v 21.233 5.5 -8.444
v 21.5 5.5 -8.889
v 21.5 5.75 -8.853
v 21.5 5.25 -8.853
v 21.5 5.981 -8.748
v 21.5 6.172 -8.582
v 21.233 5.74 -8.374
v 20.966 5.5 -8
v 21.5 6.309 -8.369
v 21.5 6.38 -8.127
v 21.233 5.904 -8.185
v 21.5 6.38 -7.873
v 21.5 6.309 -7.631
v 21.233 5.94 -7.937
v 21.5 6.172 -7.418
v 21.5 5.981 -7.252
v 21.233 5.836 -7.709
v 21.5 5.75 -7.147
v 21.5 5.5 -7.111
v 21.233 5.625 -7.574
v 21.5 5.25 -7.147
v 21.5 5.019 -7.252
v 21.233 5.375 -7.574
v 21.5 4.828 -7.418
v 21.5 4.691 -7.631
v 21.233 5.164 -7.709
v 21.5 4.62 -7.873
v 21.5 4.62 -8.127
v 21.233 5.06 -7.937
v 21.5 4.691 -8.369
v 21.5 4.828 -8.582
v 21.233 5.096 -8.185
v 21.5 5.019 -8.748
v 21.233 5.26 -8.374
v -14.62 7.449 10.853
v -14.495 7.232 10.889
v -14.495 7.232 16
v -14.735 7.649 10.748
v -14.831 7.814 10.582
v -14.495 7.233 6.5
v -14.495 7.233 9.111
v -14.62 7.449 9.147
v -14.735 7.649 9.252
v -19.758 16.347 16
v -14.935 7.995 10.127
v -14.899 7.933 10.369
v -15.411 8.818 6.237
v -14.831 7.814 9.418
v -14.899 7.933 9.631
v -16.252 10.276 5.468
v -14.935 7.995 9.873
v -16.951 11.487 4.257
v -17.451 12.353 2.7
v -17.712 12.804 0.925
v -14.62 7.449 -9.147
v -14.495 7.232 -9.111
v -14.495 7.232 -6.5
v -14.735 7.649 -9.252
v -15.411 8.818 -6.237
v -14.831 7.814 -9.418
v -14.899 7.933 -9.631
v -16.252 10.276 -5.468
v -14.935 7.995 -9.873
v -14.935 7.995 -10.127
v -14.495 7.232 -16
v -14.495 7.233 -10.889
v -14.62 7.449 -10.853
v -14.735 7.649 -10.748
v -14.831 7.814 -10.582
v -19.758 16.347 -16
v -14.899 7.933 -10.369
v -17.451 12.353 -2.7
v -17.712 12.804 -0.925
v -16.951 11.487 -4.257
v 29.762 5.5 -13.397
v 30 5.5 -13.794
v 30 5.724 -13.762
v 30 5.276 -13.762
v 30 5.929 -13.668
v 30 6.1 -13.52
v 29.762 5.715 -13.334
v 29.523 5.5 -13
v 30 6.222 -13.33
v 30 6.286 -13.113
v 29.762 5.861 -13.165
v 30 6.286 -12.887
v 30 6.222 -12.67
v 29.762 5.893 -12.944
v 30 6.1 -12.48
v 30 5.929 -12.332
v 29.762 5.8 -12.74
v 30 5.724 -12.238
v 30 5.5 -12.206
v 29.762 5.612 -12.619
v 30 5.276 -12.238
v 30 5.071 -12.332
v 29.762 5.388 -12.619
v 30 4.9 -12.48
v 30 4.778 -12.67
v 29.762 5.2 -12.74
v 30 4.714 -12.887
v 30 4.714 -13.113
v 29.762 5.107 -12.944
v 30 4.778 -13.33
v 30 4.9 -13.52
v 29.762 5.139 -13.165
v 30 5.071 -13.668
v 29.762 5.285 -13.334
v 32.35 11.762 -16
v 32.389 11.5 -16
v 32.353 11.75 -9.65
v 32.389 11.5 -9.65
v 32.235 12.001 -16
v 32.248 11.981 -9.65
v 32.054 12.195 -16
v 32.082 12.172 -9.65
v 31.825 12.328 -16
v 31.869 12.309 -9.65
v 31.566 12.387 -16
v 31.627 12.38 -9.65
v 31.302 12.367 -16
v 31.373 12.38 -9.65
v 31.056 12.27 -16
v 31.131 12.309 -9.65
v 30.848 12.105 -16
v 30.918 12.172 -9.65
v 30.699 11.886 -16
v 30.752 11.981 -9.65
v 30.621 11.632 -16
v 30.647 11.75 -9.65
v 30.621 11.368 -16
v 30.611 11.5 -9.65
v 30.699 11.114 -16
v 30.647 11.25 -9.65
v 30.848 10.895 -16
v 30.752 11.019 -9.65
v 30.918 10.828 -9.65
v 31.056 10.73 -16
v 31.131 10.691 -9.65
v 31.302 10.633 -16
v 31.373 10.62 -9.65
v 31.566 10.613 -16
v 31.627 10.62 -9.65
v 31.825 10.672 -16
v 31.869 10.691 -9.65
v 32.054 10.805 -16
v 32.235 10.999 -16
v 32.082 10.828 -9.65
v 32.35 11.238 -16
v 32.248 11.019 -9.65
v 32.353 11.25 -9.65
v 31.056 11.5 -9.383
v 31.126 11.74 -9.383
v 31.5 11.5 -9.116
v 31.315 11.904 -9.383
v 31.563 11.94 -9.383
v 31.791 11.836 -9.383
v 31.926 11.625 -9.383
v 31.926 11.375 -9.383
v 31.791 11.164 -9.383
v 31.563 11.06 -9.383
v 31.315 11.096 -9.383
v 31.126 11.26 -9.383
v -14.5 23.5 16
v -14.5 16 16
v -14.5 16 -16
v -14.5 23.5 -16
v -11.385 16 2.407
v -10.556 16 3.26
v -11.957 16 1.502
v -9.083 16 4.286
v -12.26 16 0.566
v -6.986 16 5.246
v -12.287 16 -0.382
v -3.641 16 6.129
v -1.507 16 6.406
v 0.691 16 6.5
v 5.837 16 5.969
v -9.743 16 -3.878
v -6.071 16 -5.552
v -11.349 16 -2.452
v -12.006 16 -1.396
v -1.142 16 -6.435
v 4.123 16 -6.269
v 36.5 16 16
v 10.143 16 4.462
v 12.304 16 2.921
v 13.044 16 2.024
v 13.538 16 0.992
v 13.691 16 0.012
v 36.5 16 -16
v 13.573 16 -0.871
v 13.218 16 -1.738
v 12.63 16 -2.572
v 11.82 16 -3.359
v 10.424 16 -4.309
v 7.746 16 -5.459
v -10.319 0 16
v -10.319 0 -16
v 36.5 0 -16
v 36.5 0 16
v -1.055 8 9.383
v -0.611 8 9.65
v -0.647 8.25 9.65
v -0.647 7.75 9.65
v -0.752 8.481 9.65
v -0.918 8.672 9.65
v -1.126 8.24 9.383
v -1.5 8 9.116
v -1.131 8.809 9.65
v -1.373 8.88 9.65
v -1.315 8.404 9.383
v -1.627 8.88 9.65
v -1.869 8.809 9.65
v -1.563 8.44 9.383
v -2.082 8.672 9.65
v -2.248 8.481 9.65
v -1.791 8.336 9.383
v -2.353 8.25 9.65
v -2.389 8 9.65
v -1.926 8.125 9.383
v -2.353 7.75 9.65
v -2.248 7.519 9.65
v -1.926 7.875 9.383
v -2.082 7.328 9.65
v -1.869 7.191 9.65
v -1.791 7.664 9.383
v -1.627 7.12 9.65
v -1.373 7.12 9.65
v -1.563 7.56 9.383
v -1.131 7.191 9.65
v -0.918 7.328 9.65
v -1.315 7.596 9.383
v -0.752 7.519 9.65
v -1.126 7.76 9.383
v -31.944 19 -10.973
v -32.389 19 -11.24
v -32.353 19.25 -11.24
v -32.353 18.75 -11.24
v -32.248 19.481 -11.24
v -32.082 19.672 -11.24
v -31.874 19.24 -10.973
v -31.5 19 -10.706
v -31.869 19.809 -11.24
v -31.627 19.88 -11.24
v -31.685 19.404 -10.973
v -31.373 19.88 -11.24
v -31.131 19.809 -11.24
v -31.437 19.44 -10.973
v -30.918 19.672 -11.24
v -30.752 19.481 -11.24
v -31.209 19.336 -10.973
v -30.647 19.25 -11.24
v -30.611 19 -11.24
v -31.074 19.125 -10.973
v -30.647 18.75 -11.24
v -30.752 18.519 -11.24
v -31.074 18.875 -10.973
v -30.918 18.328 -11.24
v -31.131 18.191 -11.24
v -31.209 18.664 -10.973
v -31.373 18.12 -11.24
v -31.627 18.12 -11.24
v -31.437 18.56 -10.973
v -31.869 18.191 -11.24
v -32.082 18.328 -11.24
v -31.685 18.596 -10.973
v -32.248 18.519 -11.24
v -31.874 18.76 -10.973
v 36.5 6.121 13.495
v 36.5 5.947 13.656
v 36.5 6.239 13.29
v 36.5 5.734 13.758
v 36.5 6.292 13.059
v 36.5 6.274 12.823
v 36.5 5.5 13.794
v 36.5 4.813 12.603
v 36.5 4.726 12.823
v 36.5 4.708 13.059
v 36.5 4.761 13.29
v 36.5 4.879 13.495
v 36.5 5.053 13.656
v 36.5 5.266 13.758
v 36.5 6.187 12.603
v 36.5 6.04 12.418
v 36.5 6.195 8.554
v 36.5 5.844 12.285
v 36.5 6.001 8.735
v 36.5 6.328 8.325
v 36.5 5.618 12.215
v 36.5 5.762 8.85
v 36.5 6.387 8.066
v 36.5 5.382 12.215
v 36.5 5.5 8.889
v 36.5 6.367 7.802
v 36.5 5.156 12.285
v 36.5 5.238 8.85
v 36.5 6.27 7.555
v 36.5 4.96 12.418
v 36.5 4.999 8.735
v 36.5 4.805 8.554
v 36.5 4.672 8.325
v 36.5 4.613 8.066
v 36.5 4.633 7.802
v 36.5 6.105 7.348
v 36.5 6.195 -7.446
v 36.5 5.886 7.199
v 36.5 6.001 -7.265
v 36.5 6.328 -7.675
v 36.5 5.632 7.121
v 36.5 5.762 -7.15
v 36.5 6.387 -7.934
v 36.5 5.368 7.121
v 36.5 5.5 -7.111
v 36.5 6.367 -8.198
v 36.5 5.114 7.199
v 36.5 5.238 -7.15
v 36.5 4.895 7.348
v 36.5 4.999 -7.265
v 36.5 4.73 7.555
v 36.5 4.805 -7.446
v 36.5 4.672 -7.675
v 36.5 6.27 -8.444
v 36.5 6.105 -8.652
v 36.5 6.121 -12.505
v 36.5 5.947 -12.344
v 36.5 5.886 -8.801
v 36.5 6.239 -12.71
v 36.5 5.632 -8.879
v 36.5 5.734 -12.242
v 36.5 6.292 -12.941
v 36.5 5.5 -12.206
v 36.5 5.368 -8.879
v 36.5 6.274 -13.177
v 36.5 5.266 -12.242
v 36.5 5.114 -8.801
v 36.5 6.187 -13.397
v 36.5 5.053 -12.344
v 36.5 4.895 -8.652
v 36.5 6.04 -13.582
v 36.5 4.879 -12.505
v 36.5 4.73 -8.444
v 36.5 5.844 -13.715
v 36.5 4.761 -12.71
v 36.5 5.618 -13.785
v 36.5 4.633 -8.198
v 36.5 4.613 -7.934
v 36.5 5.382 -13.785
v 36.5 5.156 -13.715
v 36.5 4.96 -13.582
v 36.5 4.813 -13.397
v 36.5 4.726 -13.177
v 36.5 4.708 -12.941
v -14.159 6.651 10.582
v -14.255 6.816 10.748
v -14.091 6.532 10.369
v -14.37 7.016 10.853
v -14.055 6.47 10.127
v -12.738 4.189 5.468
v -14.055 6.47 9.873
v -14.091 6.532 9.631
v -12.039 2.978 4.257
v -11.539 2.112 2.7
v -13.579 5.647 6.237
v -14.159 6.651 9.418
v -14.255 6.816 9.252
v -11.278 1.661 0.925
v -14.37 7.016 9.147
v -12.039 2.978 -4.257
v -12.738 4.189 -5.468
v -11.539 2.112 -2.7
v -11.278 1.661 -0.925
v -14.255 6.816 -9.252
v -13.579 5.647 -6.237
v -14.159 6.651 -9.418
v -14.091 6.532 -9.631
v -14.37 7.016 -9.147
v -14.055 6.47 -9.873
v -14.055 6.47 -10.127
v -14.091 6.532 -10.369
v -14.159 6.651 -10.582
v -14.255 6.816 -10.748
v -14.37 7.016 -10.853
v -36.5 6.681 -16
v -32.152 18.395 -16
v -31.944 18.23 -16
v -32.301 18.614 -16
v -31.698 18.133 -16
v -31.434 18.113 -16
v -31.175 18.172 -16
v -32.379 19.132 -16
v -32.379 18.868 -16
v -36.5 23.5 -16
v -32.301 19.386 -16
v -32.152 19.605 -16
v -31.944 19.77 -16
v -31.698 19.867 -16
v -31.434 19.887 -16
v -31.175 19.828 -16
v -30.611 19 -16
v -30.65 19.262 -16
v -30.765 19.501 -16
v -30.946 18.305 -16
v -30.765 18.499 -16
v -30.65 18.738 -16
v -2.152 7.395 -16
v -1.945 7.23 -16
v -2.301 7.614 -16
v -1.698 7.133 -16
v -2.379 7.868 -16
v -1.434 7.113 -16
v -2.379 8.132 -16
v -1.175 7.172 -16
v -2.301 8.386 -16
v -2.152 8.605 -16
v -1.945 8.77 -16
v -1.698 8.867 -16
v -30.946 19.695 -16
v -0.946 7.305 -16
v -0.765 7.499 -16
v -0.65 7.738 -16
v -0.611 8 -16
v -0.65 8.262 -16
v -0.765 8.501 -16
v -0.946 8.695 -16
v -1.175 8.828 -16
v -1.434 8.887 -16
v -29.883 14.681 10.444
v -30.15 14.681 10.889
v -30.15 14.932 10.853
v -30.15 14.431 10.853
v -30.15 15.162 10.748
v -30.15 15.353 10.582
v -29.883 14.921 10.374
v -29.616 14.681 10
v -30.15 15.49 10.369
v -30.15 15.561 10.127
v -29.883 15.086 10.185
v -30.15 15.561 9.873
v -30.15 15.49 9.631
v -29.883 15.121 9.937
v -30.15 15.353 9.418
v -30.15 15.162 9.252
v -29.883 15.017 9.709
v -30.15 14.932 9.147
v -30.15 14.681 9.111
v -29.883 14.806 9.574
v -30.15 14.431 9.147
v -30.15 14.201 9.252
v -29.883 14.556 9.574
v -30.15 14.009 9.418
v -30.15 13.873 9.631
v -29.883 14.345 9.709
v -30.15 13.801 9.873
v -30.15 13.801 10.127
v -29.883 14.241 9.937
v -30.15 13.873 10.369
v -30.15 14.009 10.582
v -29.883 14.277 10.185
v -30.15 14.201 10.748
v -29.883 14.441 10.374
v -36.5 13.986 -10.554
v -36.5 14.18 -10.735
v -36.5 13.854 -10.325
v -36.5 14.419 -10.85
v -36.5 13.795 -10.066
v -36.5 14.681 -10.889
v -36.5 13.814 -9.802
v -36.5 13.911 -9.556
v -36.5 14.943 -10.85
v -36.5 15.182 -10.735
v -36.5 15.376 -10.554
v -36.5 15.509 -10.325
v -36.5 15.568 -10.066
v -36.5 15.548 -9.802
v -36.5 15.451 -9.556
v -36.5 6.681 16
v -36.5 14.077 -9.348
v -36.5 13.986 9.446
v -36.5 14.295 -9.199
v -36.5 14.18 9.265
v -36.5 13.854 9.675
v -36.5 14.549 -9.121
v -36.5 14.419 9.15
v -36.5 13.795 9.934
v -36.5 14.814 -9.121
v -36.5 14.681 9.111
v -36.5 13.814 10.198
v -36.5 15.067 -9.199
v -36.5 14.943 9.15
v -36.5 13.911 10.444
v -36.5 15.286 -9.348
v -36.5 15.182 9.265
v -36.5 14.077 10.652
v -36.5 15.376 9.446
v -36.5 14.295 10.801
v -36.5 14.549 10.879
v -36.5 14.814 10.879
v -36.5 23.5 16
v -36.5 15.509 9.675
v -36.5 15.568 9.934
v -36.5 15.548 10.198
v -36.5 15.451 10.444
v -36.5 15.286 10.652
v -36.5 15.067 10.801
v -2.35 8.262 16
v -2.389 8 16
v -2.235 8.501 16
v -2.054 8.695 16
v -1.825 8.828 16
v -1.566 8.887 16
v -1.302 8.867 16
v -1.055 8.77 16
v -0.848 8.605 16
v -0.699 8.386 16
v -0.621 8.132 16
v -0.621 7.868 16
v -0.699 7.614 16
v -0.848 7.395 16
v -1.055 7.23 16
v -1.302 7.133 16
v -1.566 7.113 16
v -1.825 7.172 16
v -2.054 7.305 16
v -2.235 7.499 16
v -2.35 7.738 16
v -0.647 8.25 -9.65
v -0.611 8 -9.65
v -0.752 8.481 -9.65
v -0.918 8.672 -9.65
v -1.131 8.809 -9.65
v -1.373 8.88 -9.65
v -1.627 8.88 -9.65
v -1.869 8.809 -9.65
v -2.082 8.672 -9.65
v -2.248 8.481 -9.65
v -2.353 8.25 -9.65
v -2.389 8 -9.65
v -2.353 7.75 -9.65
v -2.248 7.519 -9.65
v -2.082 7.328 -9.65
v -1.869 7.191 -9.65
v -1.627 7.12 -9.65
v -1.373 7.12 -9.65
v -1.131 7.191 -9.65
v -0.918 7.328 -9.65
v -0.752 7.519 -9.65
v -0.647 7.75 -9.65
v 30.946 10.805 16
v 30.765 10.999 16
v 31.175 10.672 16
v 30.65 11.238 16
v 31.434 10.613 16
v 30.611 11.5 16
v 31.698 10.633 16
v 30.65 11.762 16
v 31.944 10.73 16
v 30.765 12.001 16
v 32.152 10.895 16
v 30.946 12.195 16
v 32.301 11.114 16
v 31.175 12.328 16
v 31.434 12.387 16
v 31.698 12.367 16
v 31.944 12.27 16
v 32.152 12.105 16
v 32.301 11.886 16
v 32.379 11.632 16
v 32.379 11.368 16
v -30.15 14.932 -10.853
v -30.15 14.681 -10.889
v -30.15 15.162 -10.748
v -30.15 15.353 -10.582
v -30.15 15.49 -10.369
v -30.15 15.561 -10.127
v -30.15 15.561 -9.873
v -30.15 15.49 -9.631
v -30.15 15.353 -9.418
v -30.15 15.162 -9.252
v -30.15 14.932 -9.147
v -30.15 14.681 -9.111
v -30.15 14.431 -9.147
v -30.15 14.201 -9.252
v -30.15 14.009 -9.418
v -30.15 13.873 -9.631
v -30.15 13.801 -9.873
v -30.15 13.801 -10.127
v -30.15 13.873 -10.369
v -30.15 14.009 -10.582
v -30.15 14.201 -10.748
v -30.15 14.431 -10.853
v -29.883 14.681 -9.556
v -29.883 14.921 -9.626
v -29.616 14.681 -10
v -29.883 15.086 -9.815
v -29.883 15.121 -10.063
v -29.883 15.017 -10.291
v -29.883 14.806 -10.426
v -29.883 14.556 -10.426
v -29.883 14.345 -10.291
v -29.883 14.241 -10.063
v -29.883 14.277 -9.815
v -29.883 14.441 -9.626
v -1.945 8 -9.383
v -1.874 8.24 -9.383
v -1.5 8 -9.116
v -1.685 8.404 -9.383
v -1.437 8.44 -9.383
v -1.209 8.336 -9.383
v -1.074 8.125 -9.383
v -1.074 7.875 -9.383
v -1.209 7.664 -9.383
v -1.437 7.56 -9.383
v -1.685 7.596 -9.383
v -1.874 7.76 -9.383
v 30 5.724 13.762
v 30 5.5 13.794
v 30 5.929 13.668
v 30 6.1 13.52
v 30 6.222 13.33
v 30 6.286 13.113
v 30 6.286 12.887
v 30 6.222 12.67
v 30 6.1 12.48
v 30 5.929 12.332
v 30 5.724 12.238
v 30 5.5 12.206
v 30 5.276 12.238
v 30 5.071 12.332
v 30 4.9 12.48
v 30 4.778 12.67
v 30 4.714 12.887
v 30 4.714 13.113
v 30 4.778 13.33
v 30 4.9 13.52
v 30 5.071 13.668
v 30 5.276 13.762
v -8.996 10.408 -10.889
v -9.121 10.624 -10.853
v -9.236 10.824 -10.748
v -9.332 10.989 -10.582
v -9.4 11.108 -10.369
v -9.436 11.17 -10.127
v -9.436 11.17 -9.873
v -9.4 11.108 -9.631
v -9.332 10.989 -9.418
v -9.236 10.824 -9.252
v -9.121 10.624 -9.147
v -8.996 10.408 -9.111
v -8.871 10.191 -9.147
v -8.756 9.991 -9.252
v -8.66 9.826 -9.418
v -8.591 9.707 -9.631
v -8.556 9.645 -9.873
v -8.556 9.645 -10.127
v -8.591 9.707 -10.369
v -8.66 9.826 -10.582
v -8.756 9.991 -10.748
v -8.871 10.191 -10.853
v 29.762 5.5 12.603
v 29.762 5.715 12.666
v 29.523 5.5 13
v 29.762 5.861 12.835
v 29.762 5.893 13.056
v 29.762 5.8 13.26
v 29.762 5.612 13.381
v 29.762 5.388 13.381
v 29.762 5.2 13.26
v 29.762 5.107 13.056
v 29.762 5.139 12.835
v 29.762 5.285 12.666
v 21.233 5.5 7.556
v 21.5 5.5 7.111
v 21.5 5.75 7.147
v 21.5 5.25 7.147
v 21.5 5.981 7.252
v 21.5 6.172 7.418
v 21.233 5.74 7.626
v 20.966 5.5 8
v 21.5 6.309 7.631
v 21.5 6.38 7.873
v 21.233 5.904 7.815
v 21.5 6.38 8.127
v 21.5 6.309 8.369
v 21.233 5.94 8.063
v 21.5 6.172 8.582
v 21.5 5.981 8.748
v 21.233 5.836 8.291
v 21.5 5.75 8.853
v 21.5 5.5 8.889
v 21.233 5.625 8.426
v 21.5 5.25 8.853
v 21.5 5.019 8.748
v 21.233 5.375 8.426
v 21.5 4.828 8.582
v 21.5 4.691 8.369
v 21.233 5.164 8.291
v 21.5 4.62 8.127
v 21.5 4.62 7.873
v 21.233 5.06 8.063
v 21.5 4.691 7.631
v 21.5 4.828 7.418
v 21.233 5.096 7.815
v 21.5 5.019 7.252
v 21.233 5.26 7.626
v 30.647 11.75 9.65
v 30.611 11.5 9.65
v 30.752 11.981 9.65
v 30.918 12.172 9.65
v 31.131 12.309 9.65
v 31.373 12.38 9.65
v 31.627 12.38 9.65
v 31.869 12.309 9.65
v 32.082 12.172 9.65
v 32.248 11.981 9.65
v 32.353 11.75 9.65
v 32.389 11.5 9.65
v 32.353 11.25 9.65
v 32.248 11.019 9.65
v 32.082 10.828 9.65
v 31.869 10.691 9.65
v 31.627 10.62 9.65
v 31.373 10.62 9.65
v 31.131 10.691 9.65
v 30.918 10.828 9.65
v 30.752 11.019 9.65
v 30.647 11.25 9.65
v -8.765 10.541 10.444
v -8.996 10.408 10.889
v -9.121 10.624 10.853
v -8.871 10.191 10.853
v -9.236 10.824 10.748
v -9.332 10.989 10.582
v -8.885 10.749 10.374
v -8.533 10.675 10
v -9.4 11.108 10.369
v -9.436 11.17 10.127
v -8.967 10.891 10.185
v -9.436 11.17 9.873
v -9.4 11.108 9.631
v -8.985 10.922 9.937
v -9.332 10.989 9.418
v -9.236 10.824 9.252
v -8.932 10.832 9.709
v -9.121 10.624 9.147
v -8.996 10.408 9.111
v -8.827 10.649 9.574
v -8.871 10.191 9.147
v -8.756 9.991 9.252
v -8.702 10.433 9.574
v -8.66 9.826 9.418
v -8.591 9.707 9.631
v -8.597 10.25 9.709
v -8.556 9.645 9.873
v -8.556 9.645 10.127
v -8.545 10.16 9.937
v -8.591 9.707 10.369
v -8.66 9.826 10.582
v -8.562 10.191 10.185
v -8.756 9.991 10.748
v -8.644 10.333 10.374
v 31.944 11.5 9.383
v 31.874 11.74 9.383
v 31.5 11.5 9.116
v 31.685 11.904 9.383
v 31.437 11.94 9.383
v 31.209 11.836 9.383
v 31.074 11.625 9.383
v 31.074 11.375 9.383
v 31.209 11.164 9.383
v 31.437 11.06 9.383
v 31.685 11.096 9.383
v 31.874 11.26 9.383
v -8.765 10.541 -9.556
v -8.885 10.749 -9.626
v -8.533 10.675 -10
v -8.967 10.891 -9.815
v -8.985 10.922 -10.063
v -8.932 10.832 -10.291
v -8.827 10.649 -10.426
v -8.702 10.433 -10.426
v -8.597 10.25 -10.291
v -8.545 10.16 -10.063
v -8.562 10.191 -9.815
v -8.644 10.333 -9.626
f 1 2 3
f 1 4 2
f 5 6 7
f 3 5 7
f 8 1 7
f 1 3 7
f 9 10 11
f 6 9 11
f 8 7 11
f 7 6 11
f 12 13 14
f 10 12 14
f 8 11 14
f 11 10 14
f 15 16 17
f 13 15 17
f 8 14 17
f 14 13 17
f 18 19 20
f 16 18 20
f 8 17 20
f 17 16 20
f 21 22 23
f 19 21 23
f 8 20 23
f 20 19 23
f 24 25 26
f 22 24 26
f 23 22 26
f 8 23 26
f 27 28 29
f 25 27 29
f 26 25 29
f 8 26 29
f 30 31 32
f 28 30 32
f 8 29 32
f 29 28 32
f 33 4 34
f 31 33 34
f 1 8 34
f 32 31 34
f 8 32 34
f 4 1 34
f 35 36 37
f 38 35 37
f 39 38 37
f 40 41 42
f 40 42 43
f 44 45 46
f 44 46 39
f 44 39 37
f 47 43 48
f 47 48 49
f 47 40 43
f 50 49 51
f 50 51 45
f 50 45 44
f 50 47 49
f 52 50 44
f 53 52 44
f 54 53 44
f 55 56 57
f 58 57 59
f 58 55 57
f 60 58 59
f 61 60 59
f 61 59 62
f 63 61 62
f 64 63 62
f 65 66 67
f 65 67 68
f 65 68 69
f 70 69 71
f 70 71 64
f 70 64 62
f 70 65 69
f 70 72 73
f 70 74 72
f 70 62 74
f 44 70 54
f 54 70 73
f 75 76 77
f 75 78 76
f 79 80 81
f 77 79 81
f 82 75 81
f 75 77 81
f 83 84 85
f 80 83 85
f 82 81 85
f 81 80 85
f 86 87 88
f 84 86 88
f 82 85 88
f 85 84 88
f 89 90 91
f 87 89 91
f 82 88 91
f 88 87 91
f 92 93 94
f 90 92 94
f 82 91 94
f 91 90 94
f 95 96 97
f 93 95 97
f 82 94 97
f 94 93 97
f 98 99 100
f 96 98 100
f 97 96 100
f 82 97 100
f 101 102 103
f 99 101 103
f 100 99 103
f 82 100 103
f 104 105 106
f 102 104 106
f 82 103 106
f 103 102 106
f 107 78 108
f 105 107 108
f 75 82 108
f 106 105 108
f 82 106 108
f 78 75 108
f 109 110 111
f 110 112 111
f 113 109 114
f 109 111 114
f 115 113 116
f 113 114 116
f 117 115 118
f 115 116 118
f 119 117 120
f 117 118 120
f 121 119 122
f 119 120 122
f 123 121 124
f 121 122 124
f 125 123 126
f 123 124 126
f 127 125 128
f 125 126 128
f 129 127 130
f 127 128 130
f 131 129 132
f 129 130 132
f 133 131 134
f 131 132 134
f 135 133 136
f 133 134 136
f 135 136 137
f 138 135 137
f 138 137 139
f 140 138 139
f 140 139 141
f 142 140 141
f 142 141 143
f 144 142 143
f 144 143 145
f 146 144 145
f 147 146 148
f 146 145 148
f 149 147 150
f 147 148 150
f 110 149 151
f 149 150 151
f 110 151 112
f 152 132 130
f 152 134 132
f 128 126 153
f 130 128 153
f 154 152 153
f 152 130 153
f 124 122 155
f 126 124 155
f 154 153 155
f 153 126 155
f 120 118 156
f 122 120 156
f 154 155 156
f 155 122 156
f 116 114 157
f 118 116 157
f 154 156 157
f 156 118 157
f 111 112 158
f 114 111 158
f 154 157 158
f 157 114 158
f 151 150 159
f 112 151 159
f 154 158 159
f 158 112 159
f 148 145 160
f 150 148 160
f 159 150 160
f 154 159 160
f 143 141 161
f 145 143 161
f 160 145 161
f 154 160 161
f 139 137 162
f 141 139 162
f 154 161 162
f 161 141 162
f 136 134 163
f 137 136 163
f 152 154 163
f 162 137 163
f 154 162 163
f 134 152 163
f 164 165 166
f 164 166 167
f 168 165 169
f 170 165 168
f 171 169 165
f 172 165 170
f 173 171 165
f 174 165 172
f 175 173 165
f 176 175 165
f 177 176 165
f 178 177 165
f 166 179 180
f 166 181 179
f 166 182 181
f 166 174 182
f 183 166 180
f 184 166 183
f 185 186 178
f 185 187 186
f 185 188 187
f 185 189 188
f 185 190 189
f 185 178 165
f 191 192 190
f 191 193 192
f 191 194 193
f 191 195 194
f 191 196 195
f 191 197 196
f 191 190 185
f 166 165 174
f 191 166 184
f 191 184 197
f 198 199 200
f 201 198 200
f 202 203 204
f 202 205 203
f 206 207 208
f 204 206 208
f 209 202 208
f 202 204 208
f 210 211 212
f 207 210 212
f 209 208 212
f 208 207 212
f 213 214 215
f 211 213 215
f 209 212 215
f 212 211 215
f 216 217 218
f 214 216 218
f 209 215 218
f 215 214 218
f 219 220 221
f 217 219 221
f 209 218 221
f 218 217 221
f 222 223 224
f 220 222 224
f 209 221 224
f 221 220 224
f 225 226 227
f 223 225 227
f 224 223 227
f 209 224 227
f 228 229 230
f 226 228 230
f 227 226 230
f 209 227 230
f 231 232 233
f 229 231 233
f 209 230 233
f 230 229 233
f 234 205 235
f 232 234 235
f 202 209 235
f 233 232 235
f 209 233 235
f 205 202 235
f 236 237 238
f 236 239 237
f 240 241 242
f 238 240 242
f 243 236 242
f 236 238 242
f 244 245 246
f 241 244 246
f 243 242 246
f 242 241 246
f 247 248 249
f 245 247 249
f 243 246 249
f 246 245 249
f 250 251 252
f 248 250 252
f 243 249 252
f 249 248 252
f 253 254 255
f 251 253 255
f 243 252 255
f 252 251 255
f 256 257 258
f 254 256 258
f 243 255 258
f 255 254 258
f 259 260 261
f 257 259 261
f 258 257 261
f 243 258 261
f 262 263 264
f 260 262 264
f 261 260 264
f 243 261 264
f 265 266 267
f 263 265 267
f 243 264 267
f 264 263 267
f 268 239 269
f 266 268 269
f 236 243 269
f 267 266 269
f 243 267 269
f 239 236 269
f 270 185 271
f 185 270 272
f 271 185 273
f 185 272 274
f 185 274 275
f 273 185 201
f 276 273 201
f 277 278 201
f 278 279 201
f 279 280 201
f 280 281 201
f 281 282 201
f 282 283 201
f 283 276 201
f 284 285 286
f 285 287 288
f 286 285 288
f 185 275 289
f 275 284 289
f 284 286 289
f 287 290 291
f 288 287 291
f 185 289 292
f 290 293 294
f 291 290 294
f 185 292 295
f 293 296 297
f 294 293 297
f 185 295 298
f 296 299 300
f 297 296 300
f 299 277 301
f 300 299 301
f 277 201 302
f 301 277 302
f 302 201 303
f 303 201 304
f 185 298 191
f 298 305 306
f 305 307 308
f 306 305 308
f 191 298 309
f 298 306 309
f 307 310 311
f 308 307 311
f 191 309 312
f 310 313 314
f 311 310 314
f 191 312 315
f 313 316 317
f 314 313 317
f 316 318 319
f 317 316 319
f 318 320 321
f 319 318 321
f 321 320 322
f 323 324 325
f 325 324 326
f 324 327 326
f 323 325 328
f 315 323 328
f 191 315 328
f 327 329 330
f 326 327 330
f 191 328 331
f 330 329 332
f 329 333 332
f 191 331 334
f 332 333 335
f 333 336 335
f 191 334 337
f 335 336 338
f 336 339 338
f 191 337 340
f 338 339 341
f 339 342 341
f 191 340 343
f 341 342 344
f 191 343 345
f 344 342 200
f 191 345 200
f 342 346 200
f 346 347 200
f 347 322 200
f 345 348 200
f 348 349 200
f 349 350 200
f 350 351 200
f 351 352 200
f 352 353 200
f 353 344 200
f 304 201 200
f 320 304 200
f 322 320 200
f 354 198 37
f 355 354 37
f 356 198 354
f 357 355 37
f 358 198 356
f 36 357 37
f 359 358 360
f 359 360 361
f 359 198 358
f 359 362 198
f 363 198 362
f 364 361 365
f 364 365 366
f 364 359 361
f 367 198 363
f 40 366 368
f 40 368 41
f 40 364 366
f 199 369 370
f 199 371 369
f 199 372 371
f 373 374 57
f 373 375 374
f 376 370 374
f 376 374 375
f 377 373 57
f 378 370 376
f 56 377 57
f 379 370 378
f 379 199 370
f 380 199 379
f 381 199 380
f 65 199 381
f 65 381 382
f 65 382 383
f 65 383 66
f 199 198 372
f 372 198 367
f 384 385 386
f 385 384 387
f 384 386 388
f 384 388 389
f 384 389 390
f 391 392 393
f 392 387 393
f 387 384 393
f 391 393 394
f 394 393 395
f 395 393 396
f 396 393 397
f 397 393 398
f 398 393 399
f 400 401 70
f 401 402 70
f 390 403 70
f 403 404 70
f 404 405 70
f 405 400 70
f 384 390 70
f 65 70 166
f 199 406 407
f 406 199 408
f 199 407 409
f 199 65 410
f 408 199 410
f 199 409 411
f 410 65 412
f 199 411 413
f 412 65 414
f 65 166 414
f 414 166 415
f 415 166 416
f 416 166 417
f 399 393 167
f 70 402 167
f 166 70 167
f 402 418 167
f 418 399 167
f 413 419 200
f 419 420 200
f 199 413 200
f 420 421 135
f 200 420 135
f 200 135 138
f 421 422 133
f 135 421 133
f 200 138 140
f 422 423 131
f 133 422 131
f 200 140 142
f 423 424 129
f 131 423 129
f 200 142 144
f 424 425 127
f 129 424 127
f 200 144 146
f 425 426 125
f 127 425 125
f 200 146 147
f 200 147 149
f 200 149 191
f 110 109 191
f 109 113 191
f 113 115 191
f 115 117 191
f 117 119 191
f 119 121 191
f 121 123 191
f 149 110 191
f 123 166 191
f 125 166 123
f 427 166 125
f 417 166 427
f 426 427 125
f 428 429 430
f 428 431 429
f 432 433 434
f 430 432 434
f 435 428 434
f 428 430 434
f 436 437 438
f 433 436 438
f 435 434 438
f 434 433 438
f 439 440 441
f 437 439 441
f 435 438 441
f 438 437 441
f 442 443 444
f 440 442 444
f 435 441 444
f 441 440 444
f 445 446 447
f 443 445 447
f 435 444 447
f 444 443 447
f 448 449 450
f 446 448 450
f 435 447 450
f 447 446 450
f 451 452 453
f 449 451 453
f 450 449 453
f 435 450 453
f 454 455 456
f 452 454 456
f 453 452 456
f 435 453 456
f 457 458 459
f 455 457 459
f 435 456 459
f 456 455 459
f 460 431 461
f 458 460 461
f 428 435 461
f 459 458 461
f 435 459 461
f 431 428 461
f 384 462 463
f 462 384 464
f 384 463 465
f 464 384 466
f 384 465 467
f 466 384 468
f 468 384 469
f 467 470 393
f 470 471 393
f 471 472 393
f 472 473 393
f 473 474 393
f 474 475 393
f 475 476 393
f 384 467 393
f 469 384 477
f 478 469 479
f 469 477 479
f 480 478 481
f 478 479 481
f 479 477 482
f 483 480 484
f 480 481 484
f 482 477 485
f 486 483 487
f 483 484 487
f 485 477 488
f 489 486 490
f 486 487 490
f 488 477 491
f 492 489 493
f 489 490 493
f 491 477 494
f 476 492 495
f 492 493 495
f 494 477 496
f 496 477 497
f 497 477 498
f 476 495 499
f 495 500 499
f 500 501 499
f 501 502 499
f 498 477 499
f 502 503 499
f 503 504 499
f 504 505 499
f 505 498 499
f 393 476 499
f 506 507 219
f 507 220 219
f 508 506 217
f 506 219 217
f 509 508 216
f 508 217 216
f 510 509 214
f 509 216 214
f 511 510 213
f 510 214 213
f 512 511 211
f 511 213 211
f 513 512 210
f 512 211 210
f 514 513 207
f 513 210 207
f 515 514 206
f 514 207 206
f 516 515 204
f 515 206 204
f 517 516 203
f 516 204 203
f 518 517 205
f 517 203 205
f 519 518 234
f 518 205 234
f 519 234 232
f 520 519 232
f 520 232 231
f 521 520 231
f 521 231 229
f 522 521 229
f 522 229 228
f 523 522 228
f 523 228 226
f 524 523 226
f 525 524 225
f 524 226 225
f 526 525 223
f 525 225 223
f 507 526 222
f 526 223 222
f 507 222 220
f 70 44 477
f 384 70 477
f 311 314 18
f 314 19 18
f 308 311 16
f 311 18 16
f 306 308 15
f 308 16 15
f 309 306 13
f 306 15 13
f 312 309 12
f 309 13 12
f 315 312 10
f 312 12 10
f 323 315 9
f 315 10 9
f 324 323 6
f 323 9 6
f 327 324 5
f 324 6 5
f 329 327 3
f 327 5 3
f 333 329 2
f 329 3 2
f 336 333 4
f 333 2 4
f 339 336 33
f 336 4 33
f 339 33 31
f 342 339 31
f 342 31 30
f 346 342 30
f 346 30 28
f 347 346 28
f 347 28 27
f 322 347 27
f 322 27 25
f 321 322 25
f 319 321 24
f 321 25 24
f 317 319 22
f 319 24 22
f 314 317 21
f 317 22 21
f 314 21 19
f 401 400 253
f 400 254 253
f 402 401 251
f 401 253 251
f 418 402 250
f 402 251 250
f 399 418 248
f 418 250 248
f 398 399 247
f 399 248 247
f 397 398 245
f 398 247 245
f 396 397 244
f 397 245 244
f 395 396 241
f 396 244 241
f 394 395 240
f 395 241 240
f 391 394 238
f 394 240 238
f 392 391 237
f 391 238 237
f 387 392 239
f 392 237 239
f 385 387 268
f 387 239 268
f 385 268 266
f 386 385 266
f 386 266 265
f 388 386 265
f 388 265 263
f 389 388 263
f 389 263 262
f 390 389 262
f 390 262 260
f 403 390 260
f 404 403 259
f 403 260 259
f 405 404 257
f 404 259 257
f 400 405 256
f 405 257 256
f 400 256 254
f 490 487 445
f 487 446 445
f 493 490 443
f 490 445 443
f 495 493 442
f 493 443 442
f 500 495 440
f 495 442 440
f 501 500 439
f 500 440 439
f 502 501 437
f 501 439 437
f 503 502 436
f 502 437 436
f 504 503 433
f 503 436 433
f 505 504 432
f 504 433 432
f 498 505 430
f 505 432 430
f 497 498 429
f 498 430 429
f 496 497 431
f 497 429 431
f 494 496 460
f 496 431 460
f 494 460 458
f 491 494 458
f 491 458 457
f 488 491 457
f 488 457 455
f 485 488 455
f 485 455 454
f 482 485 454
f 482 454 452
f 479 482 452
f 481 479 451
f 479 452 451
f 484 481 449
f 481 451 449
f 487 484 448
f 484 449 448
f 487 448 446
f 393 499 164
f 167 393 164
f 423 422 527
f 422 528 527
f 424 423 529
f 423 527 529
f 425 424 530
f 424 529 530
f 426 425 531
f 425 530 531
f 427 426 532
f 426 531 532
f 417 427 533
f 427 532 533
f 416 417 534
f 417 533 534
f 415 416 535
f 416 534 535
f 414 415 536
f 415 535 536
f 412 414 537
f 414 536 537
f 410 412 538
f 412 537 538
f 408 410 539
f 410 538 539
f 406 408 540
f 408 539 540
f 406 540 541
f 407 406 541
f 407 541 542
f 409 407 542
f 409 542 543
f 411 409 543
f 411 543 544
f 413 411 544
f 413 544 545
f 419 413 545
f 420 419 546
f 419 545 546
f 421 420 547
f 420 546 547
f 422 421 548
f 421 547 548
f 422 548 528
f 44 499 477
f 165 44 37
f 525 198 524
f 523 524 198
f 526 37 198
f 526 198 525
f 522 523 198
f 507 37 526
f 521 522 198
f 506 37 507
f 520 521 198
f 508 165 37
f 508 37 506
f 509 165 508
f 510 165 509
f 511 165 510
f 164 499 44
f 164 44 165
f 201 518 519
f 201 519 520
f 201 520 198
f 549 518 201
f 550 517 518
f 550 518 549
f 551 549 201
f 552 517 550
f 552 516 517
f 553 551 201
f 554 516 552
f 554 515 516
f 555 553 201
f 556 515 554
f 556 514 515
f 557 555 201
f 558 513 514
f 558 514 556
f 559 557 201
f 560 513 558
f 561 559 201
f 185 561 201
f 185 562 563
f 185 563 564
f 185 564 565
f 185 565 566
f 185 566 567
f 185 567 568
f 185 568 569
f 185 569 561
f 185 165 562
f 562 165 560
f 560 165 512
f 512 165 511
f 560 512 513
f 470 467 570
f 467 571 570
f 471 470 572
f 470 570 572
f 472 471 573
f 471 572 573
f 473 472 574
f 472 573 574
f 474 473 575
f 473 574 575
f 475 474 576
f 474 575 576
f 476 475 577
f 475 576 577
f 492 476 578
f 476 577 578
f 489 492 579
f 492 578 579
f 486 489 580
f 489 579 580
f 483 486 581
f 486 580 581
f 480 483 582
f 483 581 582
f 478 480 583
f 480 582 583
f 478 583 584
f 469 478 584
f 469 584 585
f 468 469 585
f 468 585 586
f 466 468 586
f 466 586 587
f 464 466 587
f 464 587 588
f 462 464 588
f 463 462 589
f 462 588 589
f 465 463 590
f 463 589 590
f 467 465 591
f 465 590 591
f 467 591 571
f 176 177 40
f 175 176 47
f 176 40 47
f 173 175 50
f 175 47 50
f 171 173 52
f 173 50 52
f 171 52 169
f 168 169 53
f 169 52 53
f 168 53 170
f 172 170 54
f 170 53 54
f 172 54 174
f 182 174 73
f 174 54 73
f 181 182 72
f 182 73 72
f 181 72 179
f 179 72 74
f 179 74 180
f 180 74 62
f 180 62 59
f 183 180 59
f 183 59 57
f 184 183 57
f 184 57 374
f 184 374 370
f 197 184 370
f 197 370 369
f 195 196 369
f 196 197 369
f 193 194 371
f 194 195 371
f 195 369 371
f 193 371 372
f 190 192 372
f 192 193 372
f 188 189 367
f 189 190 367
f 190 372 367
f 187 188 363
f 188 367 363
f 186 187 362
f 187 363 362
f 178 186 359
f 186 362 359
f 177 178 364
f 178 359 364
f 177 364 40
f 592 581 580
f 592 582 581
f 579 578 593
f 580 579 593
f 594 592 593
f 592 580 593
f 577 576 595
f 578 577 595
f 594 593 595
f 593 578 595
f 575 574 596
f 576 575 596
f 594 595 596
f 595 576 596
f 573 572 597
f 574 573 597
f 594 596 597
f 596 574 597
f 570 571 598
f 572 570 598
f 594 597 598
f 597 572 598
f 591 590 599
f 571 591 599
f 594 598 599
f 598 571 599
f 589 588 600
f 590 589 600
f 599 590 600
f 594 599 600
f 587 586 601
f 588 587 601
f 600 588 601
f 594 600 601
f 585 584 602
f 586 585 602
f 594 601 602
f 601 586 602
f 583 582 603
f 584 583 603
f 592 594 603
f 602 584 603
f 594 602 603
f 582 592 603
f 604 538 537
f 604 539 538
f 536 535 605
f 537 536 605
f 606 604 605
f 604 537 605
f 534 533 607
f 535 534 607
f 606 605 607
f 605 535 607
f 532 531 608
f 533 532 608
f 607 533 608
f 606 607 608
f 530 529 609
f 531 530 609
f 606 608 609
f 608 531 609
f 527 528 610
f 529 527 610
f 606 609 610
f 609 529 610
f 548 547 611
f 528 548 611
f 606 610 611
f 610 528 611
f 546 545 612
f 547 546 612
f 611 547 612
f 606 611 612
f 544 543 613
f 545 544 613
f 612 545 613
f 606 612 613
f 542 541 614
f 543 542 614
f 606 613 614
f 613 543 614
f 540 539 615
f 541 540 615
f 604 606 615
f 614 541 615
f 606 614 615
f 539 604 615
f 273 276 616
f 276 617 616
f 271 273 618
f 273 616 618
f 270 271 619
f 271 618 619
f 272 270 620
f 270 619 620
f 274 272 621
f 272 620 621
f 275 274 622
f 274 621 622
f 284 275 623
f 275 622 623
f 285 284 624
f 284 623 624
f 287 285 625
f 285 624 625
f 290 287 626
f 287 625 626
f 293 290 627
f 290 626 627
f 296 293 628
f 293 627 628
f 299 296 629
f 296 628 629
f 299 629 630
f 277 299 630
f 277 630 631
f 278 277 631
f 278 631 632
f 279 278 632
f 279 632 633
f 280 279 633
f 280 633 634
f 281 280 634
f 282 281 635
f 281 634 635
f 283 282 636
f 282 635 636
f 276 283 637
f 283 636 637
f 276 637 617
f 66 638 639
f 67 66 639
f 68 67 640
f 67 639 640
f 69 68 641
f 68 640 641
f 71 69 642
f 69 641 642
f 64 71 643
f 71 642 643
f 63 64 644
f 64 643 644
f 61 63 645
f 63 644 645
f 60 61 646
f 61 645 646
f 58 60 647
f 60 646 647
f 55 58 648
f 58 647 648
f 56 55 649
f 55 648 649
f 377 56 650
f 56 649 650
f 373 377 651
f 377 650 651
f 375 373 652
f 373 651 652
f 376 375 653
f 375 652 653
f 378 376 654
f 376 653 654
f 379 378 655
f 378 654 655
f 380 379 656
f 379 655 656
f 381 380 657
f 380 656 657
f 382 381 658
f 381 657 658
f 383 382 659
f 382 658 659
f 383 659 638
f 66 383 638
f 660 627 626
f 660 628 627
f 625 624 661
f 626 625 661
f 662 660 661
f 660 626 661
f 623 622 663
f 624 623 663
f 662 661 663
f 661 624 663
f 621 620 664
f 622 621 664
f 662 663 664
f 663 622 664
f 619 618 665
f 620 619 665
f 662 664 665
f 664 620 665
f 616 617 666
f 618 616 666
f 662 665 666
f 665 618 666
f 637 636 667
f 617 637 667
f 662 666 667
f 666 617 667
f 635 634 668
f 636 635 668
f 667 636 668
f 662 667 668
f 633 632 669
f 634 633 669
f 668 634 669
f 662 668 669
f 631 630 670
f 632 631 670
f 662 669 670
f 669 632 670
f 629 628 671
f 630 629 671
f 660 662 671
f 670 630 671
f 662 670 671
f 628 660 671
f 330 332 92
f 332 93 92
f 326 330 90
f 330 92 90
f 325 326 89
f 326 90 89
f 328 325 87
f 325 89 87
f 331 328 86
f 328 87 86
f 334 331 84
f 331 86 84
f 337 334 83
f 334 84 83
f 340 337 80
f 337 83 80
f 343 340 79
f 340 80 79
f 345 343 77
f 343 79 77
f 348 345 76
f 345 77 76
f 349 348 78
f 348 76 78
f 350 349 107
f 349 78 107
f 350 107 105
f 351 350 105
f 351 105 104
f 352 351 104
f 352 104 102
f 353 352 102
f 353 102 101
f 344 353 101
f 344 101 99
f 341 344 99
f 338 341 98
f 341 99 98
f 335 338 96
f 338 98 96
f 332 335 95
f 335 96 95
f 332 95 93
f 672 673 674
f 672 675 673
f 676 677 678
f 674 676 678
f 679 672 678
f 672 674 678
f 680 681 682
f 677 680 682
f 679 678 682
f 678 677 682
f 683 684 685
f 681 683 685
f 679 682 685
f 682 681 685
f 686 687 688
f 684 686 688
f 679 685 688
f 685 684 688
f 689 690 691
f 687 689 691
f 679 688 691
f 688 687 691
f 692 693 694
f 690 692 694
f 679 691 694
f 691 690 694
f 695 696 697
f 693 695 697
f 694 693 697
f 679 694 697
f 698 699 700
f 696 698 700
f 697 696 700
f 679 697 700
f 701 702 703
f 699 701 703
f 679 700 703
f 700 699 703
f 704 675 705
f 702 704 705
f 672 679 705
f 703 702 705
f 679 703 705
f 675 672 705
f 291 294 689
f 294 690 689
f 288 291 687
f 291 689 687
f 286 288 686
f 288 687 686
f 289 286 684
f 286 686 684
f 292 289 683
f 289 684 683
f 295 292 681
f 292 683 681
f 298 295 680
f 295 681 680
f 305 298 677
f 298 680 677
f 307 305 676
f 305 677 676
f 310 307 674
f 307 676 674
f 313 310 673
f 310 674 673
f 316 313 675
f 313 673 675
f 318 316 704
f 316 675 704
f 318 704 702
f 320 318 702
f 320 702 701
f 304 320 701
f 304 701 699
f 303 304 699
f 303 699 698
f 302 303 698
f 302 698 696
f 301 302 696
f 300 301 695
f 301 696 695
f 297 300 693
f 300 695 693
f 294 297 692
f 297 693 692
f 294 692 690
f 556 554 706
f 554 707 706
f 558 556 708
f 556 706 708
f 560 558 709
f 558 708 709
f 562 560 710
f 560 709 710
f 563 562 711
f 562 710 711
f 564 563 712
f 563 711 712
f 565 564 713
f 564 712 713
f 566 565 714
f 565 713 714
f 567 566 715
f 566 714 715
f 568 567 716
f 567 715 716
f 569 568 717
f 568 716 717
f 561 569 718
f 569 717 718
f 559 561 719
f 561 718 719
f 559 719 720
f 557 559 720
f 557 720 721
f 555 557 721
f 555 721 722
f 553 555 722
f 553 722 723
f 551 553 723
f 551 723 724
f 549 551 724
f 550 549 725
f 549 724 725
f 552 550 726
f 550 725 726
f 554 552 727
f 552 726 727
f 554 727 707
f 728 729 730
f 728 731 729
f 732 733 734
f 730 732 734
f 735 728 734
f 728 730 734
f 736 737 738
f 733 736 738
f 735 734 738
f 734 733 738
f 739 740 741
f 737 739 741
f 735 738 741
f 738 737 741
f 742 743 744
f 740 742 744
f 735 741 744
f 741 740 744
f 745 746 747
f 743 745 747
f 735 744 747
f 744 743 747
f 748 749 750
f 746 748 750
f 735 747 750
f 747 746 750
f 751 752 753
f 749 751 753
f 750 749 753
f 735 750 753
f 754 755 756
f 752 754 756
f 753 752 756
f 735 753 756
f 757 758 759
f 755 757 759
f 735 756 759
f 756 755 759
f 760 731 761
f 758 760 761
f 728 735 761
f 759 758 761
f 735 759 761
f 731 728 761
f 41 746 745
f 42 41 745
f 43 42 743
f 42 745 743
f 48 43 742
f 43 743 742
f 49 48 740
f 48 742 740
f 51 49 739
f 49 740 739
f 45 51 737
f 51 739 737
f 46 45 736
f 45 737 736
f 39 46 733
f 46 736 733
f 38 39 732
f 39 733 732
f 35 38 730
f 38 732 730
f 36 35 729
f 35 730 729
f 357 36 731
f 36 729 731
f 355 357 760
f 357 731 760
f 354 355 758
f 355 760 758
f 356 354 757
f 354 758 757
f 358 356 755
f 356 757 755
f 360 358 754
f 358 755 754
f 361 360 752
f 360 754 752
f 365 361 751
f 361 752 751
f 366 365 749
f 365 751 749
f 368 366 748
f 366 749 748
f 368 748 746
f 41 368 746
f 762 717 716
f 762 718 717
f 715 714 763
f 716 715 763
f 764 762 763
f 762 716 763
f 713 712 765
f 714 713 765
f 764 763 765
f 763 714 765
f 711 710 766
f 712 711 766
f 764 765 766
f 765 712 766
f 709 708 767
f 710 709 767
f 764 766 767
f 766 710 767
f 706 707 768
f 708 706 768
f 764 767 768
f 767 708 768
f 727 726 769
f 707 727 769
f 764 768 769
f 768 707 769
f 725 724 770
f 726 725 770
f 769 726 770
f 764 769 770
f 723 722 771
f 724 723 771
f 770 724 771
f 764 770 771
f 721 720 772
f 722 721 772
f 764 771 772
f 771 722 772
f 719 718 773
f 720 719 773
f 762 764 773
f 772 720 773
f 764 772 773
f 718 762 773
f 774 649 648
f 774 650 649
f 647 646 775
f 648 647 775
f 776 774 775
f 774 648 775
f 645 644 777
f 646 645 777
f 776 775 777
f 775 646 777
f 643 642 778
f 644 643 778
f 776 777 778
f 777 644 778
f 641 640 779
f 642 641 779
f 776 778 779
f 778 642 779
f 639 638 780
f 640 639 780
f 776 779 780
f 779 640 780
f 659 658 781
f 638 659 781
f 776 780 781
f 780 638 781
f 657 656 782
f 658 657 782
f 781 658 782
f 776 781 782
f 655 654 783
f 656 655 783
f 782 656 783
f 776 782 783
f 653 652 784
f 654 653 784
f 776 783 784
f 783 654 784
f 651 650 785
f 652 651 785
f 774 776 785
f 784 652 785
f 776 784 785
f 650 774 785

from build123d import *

# Parameters (mm, degrees)
SKETCH1_W                       = 73
SKETCH1_H                       = 32
BOSS_EXTRUDE1_DEPTH             = 16
SKETCH78_W                      = 22
SKETCH78_H                      = 7.5
BOSS_EXTRUDE4_DEPTH             = 32
CUT_EXTRUDE23_DEPTH             = 41
SKETCH14_R                      = 6.5
CUT_EXTRUDE2_DEPTH              = 41
CUT_EXTRUDE2_DEPTH_BACK         = 33
F_2_56_TAPPED_HOLE1_D           = 1.778
F_2_56_TAPPED_HOLE1_DEPTH       = 6.35
F_2_56_TAPPED_HOLE1_TIP         = 0.53416509
F_2_56_TAPPED_HOLE2_D           = 1.778
F_2_56_TAPPED_HOLE2_DEPTH       = 6.35
F_2_56_TAPPED_HOLE2_TIP         = 0.53416509
F_2_56_TAPPED_HOLE3_D           = 1.778
F_2_56_TAPPED_HOLE3_DEPTH       = 6.35
F_2_56_TAPPED_HOLE3_TIP         = 0.53416509
F_2_56_TAPPED_HOLE4_D           = 1.778
F_2_56_TAPPED_HOLE4_DEPTH       = 6.35
F_2_56_TAPPED_HOLE4_TIP         = 0.53416509
F_2_56_TAPPED_HOLE5_D           = 1.778
F_2_56_TAPPED_HOLE5_DEPTH       = 4.76
F_2_56_TAPPED_HOLE5_TIP         = 0.53416509
F_2_56_TAPPED_HOLE7_D           = 1.778
F_2_56_TAPPED_HOLE7_DEPTH       = 15
F_2_56_TAPPED_HOLE7_TIP         = 0.53416509
F_1_16_0_0625_DOWEL_HOLE1_D     = 1.5875
F_1_16_0_0625_DOWEL_HOLE1_DEPTH = 6.5
F_1_16_0_0625_DOWEL_HOLE1_TIP   = 0.476933116


with BuildPart() as part:
    # Sketch1 → Boss-Extrude1 (new body)
    with BuildSketch(Plane(origin=(0, 0, 0), x_dir=(1, 0, 0), z_dir=(0, 1, 0))):
        Rectangle(SKETCH1_W, SKETCH1_H)
    extrude(amount=BOSS_EXTRUDE1_DEPTH)

    # Sketch78 → Boss-Extrude4 (add)
    with BuildSketch(Plane.XY.offset(16)):
        with Locations((-25.5, 19.75)):
            Rectangle(SKETCH78_W, SKETCH78_H)
    extrude(amount=-BOSS_EXTRUDE4_DEPTH)

    # Sketch79 → Cut-Extrude23 (cut)
    with BuildSketch(Plane(origin=(0, 0, -16), x_dir=(-1, 0, 0), z_dir=(0, 0, -1))):
        Polygon((14.495082625, 7.2325), (19.757582625, 16.347417375), (36.5, 6.681178197), (36.5, 0), (10.319396803, 0), align=None)
    extrude(amount=-CUT_EXTRUDE23_DEPTH, mode=Mode.SUBTRACT)

    # Sketch14 → Cut-Extrude2 (cut, two sides)
    with BuildSketch(Plane(origin=(-13.426065962, 5.380908825, -20), x_dir=(0, 0, 1), z_dir=(-0.866025404, -0.5, 0))) as cut_extrude2_sk:
        with Locations((20, 2.138033327)):
            Circle(SKETCH14_R)
    extrude(amount=CUT_EXTRUDE2_DEPTH, mode=Mode.SUBTRACT)
    extrude(cut_extrude2_sk.sketch, amount=-CUT_EXTRUDE2_DEPTH_BACK, mode=Mode.SUBTRACT)

    # #2-56 Tapped Hole1
    with Locations(Plane.ZY.offset(36.5)):
        with Locations((-10, 14.681178197), (10, 14.681178197)):
            Hole(F_2_56_TAPPED_HOLE1_D / 2, depth=F_2_56_TAPPED_HOLE1_DEPTH)
            with Locations((0, 0, -(F_2_56_TAPPED_HOLE1_DEPTH + F_2_56_TAPPED_HOLE1_TIP / 2))):  # 118° drill point
                Cone(0, F_2_56_TAPPED_HOLE1_D / 2, F_2_56_TAPPED_HOLE1_TIP, mode=Mode.SUBTRACT)

    # #2-56 Tapped Hole2
    with Locations(Plane(origin=(0, 0, -16), x_dir=(-1, 0, 0), z_dir=(0, 0, -1))):
        with Locations((-31.5, 11.5), (1.5, 8)):
            Hole(F_2_56_TAPPED_HOLE2_D / 2, depth=F_2_56_TAPPED_HOLE2_DEPTH)
            with Locations((0, 0, -(F_2_56_TAPPED_HOLE2_DEPTH + F_2_56_TAPPED_HOLE2_TIP / 2))):  # 118° drill point
                Cone(0, F_2_56_TAPPED_HOLE2_D / 2, F_2_56_TAPPED_HOLE2_TIP, mode=Mode.SUBTRACT)

    # #2-56 Tapped Hole3
    with Locations(Plane.XY.offset(16)):
        with Locations((-1.5, 8), (31.5, 11.5)):
            Hole(F_2_56_TAPPED_HOLE3_D / 2, depth=F_2_56_TAPPED_HOLE3_DEPTH)
            with Locations((0, 0, -(F_2_56_TAPPED_HOLE3_DEPTH + F_2_56_TAPPED_HOLE3_TIP / 2))):  # 118° drill point
                Cone(0, F_2_56_TAPPED_HOLE3_D / 2, F_2_56_TAPPED_HOLE3_TIP, mode=Mode.SUBTRACT)

    # #2-56 Tapped Hole4
    with Locations(Plane(origin=(-7.739547602, -4.468429892, 0), x_dir=(0, 0, 1), z_dir=(-0.866025404, -0.5, 0))):
        with Locations((-10, 13.511070046), (10, 13.511070046), (0, 13.511070046)):
            Hole(F_2_56_TAPPED_HOLE4_D / 2, depth=F_2_56_TAPPED_HOLE4_DEPTH)
            with Locations((0, 0, -(F_2_56_TAPPED_HOLE4_DEPTH + F_2_56_TAPPED_HOLE4_TIP / 2))):  # 118° drill point
                Cone(0, F_2_56_TAPPED_HOLE4_D / 2, F_2_56_TAPPED_HOLE4_TIP, mode=Mode.SUBTRACT)

    # #2-56 Tapped Hole5
    with Locations(Plane(origin=(0, 0, -16), x_dir=(-1, 0, 0), z_dir=(0, 0, -1))):
        with Locations((31.5, 19)):
            Hole(F_2_56_TAPPED_HOLE5_D / 2, depth=F_2_56_TAPPED_HOLE5_DEPTH)
            with Locations((0, 0, -(F_2_56_TAPPED_HOLE5_DEPTH + F_2_56_TAPPED_HOLE5_TIP / 2))):  # 118° drill point
                Cone(0, F_2_56_TAPPED_HOLE5_D / 2, F_2_56_TAPPED_HOLE5_TIP, mode=Mode.SUBTRACT)

    # #2-56 Tapped Hole7
    with Locations(Plane(origin=(36.5, 0, 0), x_dir=(0, 0, -1), z_dir=(1, 0, 0))):
        with Locations((-8, 5.5), (8, 5.5)):
            Hole(F_2_56_TAPPED_HOLE7_D / 2, depth=F_2_56_TAPPED_HOLE7_DEPTH)
            with Locations((0, 0, -(F_2_56_TAPPED_HOLE7_DEPTH + F_2_56_TAPPED_HOLE7_TIP / 2))):  # 118° drill point
                Cone(0, F_2_56_TAPPED_HOLE7_D / 2, F_2_56_TAPPED_HOLE7_TIP, mode=Mode.SUBTRACT)

    # 1/16 (0.0625) Dowel Hole1
    with Locations(Plane(origin=(36.5, 0, 0), x_dir=(0, 0, -1), z_dir=(1, 0, 0))):
        with Locations((13, 5.5), (-13, 5.5)):
            Hole(F_1_16_0_0625_DOWEL_HOLE1_D / 2, depth=F_1_16_0_0625_DOWEL_HOLE1_DEPTH)
            with Locations((0, 0, -(F_1_16_0_0625_DOWEL_HOLE1_DEPTH + F_1_16_0_0625_DOWEL_HOLE1_TIP / 2))):  # 118° drill point
                Cone(0, F_1_16_0_0625_DOWEL_HOLE1_D / 2, F_1_16_0_0625_DOWEL_HOLE1_TIP, mode=Mode.SUBTRACT)


solid = part.part
